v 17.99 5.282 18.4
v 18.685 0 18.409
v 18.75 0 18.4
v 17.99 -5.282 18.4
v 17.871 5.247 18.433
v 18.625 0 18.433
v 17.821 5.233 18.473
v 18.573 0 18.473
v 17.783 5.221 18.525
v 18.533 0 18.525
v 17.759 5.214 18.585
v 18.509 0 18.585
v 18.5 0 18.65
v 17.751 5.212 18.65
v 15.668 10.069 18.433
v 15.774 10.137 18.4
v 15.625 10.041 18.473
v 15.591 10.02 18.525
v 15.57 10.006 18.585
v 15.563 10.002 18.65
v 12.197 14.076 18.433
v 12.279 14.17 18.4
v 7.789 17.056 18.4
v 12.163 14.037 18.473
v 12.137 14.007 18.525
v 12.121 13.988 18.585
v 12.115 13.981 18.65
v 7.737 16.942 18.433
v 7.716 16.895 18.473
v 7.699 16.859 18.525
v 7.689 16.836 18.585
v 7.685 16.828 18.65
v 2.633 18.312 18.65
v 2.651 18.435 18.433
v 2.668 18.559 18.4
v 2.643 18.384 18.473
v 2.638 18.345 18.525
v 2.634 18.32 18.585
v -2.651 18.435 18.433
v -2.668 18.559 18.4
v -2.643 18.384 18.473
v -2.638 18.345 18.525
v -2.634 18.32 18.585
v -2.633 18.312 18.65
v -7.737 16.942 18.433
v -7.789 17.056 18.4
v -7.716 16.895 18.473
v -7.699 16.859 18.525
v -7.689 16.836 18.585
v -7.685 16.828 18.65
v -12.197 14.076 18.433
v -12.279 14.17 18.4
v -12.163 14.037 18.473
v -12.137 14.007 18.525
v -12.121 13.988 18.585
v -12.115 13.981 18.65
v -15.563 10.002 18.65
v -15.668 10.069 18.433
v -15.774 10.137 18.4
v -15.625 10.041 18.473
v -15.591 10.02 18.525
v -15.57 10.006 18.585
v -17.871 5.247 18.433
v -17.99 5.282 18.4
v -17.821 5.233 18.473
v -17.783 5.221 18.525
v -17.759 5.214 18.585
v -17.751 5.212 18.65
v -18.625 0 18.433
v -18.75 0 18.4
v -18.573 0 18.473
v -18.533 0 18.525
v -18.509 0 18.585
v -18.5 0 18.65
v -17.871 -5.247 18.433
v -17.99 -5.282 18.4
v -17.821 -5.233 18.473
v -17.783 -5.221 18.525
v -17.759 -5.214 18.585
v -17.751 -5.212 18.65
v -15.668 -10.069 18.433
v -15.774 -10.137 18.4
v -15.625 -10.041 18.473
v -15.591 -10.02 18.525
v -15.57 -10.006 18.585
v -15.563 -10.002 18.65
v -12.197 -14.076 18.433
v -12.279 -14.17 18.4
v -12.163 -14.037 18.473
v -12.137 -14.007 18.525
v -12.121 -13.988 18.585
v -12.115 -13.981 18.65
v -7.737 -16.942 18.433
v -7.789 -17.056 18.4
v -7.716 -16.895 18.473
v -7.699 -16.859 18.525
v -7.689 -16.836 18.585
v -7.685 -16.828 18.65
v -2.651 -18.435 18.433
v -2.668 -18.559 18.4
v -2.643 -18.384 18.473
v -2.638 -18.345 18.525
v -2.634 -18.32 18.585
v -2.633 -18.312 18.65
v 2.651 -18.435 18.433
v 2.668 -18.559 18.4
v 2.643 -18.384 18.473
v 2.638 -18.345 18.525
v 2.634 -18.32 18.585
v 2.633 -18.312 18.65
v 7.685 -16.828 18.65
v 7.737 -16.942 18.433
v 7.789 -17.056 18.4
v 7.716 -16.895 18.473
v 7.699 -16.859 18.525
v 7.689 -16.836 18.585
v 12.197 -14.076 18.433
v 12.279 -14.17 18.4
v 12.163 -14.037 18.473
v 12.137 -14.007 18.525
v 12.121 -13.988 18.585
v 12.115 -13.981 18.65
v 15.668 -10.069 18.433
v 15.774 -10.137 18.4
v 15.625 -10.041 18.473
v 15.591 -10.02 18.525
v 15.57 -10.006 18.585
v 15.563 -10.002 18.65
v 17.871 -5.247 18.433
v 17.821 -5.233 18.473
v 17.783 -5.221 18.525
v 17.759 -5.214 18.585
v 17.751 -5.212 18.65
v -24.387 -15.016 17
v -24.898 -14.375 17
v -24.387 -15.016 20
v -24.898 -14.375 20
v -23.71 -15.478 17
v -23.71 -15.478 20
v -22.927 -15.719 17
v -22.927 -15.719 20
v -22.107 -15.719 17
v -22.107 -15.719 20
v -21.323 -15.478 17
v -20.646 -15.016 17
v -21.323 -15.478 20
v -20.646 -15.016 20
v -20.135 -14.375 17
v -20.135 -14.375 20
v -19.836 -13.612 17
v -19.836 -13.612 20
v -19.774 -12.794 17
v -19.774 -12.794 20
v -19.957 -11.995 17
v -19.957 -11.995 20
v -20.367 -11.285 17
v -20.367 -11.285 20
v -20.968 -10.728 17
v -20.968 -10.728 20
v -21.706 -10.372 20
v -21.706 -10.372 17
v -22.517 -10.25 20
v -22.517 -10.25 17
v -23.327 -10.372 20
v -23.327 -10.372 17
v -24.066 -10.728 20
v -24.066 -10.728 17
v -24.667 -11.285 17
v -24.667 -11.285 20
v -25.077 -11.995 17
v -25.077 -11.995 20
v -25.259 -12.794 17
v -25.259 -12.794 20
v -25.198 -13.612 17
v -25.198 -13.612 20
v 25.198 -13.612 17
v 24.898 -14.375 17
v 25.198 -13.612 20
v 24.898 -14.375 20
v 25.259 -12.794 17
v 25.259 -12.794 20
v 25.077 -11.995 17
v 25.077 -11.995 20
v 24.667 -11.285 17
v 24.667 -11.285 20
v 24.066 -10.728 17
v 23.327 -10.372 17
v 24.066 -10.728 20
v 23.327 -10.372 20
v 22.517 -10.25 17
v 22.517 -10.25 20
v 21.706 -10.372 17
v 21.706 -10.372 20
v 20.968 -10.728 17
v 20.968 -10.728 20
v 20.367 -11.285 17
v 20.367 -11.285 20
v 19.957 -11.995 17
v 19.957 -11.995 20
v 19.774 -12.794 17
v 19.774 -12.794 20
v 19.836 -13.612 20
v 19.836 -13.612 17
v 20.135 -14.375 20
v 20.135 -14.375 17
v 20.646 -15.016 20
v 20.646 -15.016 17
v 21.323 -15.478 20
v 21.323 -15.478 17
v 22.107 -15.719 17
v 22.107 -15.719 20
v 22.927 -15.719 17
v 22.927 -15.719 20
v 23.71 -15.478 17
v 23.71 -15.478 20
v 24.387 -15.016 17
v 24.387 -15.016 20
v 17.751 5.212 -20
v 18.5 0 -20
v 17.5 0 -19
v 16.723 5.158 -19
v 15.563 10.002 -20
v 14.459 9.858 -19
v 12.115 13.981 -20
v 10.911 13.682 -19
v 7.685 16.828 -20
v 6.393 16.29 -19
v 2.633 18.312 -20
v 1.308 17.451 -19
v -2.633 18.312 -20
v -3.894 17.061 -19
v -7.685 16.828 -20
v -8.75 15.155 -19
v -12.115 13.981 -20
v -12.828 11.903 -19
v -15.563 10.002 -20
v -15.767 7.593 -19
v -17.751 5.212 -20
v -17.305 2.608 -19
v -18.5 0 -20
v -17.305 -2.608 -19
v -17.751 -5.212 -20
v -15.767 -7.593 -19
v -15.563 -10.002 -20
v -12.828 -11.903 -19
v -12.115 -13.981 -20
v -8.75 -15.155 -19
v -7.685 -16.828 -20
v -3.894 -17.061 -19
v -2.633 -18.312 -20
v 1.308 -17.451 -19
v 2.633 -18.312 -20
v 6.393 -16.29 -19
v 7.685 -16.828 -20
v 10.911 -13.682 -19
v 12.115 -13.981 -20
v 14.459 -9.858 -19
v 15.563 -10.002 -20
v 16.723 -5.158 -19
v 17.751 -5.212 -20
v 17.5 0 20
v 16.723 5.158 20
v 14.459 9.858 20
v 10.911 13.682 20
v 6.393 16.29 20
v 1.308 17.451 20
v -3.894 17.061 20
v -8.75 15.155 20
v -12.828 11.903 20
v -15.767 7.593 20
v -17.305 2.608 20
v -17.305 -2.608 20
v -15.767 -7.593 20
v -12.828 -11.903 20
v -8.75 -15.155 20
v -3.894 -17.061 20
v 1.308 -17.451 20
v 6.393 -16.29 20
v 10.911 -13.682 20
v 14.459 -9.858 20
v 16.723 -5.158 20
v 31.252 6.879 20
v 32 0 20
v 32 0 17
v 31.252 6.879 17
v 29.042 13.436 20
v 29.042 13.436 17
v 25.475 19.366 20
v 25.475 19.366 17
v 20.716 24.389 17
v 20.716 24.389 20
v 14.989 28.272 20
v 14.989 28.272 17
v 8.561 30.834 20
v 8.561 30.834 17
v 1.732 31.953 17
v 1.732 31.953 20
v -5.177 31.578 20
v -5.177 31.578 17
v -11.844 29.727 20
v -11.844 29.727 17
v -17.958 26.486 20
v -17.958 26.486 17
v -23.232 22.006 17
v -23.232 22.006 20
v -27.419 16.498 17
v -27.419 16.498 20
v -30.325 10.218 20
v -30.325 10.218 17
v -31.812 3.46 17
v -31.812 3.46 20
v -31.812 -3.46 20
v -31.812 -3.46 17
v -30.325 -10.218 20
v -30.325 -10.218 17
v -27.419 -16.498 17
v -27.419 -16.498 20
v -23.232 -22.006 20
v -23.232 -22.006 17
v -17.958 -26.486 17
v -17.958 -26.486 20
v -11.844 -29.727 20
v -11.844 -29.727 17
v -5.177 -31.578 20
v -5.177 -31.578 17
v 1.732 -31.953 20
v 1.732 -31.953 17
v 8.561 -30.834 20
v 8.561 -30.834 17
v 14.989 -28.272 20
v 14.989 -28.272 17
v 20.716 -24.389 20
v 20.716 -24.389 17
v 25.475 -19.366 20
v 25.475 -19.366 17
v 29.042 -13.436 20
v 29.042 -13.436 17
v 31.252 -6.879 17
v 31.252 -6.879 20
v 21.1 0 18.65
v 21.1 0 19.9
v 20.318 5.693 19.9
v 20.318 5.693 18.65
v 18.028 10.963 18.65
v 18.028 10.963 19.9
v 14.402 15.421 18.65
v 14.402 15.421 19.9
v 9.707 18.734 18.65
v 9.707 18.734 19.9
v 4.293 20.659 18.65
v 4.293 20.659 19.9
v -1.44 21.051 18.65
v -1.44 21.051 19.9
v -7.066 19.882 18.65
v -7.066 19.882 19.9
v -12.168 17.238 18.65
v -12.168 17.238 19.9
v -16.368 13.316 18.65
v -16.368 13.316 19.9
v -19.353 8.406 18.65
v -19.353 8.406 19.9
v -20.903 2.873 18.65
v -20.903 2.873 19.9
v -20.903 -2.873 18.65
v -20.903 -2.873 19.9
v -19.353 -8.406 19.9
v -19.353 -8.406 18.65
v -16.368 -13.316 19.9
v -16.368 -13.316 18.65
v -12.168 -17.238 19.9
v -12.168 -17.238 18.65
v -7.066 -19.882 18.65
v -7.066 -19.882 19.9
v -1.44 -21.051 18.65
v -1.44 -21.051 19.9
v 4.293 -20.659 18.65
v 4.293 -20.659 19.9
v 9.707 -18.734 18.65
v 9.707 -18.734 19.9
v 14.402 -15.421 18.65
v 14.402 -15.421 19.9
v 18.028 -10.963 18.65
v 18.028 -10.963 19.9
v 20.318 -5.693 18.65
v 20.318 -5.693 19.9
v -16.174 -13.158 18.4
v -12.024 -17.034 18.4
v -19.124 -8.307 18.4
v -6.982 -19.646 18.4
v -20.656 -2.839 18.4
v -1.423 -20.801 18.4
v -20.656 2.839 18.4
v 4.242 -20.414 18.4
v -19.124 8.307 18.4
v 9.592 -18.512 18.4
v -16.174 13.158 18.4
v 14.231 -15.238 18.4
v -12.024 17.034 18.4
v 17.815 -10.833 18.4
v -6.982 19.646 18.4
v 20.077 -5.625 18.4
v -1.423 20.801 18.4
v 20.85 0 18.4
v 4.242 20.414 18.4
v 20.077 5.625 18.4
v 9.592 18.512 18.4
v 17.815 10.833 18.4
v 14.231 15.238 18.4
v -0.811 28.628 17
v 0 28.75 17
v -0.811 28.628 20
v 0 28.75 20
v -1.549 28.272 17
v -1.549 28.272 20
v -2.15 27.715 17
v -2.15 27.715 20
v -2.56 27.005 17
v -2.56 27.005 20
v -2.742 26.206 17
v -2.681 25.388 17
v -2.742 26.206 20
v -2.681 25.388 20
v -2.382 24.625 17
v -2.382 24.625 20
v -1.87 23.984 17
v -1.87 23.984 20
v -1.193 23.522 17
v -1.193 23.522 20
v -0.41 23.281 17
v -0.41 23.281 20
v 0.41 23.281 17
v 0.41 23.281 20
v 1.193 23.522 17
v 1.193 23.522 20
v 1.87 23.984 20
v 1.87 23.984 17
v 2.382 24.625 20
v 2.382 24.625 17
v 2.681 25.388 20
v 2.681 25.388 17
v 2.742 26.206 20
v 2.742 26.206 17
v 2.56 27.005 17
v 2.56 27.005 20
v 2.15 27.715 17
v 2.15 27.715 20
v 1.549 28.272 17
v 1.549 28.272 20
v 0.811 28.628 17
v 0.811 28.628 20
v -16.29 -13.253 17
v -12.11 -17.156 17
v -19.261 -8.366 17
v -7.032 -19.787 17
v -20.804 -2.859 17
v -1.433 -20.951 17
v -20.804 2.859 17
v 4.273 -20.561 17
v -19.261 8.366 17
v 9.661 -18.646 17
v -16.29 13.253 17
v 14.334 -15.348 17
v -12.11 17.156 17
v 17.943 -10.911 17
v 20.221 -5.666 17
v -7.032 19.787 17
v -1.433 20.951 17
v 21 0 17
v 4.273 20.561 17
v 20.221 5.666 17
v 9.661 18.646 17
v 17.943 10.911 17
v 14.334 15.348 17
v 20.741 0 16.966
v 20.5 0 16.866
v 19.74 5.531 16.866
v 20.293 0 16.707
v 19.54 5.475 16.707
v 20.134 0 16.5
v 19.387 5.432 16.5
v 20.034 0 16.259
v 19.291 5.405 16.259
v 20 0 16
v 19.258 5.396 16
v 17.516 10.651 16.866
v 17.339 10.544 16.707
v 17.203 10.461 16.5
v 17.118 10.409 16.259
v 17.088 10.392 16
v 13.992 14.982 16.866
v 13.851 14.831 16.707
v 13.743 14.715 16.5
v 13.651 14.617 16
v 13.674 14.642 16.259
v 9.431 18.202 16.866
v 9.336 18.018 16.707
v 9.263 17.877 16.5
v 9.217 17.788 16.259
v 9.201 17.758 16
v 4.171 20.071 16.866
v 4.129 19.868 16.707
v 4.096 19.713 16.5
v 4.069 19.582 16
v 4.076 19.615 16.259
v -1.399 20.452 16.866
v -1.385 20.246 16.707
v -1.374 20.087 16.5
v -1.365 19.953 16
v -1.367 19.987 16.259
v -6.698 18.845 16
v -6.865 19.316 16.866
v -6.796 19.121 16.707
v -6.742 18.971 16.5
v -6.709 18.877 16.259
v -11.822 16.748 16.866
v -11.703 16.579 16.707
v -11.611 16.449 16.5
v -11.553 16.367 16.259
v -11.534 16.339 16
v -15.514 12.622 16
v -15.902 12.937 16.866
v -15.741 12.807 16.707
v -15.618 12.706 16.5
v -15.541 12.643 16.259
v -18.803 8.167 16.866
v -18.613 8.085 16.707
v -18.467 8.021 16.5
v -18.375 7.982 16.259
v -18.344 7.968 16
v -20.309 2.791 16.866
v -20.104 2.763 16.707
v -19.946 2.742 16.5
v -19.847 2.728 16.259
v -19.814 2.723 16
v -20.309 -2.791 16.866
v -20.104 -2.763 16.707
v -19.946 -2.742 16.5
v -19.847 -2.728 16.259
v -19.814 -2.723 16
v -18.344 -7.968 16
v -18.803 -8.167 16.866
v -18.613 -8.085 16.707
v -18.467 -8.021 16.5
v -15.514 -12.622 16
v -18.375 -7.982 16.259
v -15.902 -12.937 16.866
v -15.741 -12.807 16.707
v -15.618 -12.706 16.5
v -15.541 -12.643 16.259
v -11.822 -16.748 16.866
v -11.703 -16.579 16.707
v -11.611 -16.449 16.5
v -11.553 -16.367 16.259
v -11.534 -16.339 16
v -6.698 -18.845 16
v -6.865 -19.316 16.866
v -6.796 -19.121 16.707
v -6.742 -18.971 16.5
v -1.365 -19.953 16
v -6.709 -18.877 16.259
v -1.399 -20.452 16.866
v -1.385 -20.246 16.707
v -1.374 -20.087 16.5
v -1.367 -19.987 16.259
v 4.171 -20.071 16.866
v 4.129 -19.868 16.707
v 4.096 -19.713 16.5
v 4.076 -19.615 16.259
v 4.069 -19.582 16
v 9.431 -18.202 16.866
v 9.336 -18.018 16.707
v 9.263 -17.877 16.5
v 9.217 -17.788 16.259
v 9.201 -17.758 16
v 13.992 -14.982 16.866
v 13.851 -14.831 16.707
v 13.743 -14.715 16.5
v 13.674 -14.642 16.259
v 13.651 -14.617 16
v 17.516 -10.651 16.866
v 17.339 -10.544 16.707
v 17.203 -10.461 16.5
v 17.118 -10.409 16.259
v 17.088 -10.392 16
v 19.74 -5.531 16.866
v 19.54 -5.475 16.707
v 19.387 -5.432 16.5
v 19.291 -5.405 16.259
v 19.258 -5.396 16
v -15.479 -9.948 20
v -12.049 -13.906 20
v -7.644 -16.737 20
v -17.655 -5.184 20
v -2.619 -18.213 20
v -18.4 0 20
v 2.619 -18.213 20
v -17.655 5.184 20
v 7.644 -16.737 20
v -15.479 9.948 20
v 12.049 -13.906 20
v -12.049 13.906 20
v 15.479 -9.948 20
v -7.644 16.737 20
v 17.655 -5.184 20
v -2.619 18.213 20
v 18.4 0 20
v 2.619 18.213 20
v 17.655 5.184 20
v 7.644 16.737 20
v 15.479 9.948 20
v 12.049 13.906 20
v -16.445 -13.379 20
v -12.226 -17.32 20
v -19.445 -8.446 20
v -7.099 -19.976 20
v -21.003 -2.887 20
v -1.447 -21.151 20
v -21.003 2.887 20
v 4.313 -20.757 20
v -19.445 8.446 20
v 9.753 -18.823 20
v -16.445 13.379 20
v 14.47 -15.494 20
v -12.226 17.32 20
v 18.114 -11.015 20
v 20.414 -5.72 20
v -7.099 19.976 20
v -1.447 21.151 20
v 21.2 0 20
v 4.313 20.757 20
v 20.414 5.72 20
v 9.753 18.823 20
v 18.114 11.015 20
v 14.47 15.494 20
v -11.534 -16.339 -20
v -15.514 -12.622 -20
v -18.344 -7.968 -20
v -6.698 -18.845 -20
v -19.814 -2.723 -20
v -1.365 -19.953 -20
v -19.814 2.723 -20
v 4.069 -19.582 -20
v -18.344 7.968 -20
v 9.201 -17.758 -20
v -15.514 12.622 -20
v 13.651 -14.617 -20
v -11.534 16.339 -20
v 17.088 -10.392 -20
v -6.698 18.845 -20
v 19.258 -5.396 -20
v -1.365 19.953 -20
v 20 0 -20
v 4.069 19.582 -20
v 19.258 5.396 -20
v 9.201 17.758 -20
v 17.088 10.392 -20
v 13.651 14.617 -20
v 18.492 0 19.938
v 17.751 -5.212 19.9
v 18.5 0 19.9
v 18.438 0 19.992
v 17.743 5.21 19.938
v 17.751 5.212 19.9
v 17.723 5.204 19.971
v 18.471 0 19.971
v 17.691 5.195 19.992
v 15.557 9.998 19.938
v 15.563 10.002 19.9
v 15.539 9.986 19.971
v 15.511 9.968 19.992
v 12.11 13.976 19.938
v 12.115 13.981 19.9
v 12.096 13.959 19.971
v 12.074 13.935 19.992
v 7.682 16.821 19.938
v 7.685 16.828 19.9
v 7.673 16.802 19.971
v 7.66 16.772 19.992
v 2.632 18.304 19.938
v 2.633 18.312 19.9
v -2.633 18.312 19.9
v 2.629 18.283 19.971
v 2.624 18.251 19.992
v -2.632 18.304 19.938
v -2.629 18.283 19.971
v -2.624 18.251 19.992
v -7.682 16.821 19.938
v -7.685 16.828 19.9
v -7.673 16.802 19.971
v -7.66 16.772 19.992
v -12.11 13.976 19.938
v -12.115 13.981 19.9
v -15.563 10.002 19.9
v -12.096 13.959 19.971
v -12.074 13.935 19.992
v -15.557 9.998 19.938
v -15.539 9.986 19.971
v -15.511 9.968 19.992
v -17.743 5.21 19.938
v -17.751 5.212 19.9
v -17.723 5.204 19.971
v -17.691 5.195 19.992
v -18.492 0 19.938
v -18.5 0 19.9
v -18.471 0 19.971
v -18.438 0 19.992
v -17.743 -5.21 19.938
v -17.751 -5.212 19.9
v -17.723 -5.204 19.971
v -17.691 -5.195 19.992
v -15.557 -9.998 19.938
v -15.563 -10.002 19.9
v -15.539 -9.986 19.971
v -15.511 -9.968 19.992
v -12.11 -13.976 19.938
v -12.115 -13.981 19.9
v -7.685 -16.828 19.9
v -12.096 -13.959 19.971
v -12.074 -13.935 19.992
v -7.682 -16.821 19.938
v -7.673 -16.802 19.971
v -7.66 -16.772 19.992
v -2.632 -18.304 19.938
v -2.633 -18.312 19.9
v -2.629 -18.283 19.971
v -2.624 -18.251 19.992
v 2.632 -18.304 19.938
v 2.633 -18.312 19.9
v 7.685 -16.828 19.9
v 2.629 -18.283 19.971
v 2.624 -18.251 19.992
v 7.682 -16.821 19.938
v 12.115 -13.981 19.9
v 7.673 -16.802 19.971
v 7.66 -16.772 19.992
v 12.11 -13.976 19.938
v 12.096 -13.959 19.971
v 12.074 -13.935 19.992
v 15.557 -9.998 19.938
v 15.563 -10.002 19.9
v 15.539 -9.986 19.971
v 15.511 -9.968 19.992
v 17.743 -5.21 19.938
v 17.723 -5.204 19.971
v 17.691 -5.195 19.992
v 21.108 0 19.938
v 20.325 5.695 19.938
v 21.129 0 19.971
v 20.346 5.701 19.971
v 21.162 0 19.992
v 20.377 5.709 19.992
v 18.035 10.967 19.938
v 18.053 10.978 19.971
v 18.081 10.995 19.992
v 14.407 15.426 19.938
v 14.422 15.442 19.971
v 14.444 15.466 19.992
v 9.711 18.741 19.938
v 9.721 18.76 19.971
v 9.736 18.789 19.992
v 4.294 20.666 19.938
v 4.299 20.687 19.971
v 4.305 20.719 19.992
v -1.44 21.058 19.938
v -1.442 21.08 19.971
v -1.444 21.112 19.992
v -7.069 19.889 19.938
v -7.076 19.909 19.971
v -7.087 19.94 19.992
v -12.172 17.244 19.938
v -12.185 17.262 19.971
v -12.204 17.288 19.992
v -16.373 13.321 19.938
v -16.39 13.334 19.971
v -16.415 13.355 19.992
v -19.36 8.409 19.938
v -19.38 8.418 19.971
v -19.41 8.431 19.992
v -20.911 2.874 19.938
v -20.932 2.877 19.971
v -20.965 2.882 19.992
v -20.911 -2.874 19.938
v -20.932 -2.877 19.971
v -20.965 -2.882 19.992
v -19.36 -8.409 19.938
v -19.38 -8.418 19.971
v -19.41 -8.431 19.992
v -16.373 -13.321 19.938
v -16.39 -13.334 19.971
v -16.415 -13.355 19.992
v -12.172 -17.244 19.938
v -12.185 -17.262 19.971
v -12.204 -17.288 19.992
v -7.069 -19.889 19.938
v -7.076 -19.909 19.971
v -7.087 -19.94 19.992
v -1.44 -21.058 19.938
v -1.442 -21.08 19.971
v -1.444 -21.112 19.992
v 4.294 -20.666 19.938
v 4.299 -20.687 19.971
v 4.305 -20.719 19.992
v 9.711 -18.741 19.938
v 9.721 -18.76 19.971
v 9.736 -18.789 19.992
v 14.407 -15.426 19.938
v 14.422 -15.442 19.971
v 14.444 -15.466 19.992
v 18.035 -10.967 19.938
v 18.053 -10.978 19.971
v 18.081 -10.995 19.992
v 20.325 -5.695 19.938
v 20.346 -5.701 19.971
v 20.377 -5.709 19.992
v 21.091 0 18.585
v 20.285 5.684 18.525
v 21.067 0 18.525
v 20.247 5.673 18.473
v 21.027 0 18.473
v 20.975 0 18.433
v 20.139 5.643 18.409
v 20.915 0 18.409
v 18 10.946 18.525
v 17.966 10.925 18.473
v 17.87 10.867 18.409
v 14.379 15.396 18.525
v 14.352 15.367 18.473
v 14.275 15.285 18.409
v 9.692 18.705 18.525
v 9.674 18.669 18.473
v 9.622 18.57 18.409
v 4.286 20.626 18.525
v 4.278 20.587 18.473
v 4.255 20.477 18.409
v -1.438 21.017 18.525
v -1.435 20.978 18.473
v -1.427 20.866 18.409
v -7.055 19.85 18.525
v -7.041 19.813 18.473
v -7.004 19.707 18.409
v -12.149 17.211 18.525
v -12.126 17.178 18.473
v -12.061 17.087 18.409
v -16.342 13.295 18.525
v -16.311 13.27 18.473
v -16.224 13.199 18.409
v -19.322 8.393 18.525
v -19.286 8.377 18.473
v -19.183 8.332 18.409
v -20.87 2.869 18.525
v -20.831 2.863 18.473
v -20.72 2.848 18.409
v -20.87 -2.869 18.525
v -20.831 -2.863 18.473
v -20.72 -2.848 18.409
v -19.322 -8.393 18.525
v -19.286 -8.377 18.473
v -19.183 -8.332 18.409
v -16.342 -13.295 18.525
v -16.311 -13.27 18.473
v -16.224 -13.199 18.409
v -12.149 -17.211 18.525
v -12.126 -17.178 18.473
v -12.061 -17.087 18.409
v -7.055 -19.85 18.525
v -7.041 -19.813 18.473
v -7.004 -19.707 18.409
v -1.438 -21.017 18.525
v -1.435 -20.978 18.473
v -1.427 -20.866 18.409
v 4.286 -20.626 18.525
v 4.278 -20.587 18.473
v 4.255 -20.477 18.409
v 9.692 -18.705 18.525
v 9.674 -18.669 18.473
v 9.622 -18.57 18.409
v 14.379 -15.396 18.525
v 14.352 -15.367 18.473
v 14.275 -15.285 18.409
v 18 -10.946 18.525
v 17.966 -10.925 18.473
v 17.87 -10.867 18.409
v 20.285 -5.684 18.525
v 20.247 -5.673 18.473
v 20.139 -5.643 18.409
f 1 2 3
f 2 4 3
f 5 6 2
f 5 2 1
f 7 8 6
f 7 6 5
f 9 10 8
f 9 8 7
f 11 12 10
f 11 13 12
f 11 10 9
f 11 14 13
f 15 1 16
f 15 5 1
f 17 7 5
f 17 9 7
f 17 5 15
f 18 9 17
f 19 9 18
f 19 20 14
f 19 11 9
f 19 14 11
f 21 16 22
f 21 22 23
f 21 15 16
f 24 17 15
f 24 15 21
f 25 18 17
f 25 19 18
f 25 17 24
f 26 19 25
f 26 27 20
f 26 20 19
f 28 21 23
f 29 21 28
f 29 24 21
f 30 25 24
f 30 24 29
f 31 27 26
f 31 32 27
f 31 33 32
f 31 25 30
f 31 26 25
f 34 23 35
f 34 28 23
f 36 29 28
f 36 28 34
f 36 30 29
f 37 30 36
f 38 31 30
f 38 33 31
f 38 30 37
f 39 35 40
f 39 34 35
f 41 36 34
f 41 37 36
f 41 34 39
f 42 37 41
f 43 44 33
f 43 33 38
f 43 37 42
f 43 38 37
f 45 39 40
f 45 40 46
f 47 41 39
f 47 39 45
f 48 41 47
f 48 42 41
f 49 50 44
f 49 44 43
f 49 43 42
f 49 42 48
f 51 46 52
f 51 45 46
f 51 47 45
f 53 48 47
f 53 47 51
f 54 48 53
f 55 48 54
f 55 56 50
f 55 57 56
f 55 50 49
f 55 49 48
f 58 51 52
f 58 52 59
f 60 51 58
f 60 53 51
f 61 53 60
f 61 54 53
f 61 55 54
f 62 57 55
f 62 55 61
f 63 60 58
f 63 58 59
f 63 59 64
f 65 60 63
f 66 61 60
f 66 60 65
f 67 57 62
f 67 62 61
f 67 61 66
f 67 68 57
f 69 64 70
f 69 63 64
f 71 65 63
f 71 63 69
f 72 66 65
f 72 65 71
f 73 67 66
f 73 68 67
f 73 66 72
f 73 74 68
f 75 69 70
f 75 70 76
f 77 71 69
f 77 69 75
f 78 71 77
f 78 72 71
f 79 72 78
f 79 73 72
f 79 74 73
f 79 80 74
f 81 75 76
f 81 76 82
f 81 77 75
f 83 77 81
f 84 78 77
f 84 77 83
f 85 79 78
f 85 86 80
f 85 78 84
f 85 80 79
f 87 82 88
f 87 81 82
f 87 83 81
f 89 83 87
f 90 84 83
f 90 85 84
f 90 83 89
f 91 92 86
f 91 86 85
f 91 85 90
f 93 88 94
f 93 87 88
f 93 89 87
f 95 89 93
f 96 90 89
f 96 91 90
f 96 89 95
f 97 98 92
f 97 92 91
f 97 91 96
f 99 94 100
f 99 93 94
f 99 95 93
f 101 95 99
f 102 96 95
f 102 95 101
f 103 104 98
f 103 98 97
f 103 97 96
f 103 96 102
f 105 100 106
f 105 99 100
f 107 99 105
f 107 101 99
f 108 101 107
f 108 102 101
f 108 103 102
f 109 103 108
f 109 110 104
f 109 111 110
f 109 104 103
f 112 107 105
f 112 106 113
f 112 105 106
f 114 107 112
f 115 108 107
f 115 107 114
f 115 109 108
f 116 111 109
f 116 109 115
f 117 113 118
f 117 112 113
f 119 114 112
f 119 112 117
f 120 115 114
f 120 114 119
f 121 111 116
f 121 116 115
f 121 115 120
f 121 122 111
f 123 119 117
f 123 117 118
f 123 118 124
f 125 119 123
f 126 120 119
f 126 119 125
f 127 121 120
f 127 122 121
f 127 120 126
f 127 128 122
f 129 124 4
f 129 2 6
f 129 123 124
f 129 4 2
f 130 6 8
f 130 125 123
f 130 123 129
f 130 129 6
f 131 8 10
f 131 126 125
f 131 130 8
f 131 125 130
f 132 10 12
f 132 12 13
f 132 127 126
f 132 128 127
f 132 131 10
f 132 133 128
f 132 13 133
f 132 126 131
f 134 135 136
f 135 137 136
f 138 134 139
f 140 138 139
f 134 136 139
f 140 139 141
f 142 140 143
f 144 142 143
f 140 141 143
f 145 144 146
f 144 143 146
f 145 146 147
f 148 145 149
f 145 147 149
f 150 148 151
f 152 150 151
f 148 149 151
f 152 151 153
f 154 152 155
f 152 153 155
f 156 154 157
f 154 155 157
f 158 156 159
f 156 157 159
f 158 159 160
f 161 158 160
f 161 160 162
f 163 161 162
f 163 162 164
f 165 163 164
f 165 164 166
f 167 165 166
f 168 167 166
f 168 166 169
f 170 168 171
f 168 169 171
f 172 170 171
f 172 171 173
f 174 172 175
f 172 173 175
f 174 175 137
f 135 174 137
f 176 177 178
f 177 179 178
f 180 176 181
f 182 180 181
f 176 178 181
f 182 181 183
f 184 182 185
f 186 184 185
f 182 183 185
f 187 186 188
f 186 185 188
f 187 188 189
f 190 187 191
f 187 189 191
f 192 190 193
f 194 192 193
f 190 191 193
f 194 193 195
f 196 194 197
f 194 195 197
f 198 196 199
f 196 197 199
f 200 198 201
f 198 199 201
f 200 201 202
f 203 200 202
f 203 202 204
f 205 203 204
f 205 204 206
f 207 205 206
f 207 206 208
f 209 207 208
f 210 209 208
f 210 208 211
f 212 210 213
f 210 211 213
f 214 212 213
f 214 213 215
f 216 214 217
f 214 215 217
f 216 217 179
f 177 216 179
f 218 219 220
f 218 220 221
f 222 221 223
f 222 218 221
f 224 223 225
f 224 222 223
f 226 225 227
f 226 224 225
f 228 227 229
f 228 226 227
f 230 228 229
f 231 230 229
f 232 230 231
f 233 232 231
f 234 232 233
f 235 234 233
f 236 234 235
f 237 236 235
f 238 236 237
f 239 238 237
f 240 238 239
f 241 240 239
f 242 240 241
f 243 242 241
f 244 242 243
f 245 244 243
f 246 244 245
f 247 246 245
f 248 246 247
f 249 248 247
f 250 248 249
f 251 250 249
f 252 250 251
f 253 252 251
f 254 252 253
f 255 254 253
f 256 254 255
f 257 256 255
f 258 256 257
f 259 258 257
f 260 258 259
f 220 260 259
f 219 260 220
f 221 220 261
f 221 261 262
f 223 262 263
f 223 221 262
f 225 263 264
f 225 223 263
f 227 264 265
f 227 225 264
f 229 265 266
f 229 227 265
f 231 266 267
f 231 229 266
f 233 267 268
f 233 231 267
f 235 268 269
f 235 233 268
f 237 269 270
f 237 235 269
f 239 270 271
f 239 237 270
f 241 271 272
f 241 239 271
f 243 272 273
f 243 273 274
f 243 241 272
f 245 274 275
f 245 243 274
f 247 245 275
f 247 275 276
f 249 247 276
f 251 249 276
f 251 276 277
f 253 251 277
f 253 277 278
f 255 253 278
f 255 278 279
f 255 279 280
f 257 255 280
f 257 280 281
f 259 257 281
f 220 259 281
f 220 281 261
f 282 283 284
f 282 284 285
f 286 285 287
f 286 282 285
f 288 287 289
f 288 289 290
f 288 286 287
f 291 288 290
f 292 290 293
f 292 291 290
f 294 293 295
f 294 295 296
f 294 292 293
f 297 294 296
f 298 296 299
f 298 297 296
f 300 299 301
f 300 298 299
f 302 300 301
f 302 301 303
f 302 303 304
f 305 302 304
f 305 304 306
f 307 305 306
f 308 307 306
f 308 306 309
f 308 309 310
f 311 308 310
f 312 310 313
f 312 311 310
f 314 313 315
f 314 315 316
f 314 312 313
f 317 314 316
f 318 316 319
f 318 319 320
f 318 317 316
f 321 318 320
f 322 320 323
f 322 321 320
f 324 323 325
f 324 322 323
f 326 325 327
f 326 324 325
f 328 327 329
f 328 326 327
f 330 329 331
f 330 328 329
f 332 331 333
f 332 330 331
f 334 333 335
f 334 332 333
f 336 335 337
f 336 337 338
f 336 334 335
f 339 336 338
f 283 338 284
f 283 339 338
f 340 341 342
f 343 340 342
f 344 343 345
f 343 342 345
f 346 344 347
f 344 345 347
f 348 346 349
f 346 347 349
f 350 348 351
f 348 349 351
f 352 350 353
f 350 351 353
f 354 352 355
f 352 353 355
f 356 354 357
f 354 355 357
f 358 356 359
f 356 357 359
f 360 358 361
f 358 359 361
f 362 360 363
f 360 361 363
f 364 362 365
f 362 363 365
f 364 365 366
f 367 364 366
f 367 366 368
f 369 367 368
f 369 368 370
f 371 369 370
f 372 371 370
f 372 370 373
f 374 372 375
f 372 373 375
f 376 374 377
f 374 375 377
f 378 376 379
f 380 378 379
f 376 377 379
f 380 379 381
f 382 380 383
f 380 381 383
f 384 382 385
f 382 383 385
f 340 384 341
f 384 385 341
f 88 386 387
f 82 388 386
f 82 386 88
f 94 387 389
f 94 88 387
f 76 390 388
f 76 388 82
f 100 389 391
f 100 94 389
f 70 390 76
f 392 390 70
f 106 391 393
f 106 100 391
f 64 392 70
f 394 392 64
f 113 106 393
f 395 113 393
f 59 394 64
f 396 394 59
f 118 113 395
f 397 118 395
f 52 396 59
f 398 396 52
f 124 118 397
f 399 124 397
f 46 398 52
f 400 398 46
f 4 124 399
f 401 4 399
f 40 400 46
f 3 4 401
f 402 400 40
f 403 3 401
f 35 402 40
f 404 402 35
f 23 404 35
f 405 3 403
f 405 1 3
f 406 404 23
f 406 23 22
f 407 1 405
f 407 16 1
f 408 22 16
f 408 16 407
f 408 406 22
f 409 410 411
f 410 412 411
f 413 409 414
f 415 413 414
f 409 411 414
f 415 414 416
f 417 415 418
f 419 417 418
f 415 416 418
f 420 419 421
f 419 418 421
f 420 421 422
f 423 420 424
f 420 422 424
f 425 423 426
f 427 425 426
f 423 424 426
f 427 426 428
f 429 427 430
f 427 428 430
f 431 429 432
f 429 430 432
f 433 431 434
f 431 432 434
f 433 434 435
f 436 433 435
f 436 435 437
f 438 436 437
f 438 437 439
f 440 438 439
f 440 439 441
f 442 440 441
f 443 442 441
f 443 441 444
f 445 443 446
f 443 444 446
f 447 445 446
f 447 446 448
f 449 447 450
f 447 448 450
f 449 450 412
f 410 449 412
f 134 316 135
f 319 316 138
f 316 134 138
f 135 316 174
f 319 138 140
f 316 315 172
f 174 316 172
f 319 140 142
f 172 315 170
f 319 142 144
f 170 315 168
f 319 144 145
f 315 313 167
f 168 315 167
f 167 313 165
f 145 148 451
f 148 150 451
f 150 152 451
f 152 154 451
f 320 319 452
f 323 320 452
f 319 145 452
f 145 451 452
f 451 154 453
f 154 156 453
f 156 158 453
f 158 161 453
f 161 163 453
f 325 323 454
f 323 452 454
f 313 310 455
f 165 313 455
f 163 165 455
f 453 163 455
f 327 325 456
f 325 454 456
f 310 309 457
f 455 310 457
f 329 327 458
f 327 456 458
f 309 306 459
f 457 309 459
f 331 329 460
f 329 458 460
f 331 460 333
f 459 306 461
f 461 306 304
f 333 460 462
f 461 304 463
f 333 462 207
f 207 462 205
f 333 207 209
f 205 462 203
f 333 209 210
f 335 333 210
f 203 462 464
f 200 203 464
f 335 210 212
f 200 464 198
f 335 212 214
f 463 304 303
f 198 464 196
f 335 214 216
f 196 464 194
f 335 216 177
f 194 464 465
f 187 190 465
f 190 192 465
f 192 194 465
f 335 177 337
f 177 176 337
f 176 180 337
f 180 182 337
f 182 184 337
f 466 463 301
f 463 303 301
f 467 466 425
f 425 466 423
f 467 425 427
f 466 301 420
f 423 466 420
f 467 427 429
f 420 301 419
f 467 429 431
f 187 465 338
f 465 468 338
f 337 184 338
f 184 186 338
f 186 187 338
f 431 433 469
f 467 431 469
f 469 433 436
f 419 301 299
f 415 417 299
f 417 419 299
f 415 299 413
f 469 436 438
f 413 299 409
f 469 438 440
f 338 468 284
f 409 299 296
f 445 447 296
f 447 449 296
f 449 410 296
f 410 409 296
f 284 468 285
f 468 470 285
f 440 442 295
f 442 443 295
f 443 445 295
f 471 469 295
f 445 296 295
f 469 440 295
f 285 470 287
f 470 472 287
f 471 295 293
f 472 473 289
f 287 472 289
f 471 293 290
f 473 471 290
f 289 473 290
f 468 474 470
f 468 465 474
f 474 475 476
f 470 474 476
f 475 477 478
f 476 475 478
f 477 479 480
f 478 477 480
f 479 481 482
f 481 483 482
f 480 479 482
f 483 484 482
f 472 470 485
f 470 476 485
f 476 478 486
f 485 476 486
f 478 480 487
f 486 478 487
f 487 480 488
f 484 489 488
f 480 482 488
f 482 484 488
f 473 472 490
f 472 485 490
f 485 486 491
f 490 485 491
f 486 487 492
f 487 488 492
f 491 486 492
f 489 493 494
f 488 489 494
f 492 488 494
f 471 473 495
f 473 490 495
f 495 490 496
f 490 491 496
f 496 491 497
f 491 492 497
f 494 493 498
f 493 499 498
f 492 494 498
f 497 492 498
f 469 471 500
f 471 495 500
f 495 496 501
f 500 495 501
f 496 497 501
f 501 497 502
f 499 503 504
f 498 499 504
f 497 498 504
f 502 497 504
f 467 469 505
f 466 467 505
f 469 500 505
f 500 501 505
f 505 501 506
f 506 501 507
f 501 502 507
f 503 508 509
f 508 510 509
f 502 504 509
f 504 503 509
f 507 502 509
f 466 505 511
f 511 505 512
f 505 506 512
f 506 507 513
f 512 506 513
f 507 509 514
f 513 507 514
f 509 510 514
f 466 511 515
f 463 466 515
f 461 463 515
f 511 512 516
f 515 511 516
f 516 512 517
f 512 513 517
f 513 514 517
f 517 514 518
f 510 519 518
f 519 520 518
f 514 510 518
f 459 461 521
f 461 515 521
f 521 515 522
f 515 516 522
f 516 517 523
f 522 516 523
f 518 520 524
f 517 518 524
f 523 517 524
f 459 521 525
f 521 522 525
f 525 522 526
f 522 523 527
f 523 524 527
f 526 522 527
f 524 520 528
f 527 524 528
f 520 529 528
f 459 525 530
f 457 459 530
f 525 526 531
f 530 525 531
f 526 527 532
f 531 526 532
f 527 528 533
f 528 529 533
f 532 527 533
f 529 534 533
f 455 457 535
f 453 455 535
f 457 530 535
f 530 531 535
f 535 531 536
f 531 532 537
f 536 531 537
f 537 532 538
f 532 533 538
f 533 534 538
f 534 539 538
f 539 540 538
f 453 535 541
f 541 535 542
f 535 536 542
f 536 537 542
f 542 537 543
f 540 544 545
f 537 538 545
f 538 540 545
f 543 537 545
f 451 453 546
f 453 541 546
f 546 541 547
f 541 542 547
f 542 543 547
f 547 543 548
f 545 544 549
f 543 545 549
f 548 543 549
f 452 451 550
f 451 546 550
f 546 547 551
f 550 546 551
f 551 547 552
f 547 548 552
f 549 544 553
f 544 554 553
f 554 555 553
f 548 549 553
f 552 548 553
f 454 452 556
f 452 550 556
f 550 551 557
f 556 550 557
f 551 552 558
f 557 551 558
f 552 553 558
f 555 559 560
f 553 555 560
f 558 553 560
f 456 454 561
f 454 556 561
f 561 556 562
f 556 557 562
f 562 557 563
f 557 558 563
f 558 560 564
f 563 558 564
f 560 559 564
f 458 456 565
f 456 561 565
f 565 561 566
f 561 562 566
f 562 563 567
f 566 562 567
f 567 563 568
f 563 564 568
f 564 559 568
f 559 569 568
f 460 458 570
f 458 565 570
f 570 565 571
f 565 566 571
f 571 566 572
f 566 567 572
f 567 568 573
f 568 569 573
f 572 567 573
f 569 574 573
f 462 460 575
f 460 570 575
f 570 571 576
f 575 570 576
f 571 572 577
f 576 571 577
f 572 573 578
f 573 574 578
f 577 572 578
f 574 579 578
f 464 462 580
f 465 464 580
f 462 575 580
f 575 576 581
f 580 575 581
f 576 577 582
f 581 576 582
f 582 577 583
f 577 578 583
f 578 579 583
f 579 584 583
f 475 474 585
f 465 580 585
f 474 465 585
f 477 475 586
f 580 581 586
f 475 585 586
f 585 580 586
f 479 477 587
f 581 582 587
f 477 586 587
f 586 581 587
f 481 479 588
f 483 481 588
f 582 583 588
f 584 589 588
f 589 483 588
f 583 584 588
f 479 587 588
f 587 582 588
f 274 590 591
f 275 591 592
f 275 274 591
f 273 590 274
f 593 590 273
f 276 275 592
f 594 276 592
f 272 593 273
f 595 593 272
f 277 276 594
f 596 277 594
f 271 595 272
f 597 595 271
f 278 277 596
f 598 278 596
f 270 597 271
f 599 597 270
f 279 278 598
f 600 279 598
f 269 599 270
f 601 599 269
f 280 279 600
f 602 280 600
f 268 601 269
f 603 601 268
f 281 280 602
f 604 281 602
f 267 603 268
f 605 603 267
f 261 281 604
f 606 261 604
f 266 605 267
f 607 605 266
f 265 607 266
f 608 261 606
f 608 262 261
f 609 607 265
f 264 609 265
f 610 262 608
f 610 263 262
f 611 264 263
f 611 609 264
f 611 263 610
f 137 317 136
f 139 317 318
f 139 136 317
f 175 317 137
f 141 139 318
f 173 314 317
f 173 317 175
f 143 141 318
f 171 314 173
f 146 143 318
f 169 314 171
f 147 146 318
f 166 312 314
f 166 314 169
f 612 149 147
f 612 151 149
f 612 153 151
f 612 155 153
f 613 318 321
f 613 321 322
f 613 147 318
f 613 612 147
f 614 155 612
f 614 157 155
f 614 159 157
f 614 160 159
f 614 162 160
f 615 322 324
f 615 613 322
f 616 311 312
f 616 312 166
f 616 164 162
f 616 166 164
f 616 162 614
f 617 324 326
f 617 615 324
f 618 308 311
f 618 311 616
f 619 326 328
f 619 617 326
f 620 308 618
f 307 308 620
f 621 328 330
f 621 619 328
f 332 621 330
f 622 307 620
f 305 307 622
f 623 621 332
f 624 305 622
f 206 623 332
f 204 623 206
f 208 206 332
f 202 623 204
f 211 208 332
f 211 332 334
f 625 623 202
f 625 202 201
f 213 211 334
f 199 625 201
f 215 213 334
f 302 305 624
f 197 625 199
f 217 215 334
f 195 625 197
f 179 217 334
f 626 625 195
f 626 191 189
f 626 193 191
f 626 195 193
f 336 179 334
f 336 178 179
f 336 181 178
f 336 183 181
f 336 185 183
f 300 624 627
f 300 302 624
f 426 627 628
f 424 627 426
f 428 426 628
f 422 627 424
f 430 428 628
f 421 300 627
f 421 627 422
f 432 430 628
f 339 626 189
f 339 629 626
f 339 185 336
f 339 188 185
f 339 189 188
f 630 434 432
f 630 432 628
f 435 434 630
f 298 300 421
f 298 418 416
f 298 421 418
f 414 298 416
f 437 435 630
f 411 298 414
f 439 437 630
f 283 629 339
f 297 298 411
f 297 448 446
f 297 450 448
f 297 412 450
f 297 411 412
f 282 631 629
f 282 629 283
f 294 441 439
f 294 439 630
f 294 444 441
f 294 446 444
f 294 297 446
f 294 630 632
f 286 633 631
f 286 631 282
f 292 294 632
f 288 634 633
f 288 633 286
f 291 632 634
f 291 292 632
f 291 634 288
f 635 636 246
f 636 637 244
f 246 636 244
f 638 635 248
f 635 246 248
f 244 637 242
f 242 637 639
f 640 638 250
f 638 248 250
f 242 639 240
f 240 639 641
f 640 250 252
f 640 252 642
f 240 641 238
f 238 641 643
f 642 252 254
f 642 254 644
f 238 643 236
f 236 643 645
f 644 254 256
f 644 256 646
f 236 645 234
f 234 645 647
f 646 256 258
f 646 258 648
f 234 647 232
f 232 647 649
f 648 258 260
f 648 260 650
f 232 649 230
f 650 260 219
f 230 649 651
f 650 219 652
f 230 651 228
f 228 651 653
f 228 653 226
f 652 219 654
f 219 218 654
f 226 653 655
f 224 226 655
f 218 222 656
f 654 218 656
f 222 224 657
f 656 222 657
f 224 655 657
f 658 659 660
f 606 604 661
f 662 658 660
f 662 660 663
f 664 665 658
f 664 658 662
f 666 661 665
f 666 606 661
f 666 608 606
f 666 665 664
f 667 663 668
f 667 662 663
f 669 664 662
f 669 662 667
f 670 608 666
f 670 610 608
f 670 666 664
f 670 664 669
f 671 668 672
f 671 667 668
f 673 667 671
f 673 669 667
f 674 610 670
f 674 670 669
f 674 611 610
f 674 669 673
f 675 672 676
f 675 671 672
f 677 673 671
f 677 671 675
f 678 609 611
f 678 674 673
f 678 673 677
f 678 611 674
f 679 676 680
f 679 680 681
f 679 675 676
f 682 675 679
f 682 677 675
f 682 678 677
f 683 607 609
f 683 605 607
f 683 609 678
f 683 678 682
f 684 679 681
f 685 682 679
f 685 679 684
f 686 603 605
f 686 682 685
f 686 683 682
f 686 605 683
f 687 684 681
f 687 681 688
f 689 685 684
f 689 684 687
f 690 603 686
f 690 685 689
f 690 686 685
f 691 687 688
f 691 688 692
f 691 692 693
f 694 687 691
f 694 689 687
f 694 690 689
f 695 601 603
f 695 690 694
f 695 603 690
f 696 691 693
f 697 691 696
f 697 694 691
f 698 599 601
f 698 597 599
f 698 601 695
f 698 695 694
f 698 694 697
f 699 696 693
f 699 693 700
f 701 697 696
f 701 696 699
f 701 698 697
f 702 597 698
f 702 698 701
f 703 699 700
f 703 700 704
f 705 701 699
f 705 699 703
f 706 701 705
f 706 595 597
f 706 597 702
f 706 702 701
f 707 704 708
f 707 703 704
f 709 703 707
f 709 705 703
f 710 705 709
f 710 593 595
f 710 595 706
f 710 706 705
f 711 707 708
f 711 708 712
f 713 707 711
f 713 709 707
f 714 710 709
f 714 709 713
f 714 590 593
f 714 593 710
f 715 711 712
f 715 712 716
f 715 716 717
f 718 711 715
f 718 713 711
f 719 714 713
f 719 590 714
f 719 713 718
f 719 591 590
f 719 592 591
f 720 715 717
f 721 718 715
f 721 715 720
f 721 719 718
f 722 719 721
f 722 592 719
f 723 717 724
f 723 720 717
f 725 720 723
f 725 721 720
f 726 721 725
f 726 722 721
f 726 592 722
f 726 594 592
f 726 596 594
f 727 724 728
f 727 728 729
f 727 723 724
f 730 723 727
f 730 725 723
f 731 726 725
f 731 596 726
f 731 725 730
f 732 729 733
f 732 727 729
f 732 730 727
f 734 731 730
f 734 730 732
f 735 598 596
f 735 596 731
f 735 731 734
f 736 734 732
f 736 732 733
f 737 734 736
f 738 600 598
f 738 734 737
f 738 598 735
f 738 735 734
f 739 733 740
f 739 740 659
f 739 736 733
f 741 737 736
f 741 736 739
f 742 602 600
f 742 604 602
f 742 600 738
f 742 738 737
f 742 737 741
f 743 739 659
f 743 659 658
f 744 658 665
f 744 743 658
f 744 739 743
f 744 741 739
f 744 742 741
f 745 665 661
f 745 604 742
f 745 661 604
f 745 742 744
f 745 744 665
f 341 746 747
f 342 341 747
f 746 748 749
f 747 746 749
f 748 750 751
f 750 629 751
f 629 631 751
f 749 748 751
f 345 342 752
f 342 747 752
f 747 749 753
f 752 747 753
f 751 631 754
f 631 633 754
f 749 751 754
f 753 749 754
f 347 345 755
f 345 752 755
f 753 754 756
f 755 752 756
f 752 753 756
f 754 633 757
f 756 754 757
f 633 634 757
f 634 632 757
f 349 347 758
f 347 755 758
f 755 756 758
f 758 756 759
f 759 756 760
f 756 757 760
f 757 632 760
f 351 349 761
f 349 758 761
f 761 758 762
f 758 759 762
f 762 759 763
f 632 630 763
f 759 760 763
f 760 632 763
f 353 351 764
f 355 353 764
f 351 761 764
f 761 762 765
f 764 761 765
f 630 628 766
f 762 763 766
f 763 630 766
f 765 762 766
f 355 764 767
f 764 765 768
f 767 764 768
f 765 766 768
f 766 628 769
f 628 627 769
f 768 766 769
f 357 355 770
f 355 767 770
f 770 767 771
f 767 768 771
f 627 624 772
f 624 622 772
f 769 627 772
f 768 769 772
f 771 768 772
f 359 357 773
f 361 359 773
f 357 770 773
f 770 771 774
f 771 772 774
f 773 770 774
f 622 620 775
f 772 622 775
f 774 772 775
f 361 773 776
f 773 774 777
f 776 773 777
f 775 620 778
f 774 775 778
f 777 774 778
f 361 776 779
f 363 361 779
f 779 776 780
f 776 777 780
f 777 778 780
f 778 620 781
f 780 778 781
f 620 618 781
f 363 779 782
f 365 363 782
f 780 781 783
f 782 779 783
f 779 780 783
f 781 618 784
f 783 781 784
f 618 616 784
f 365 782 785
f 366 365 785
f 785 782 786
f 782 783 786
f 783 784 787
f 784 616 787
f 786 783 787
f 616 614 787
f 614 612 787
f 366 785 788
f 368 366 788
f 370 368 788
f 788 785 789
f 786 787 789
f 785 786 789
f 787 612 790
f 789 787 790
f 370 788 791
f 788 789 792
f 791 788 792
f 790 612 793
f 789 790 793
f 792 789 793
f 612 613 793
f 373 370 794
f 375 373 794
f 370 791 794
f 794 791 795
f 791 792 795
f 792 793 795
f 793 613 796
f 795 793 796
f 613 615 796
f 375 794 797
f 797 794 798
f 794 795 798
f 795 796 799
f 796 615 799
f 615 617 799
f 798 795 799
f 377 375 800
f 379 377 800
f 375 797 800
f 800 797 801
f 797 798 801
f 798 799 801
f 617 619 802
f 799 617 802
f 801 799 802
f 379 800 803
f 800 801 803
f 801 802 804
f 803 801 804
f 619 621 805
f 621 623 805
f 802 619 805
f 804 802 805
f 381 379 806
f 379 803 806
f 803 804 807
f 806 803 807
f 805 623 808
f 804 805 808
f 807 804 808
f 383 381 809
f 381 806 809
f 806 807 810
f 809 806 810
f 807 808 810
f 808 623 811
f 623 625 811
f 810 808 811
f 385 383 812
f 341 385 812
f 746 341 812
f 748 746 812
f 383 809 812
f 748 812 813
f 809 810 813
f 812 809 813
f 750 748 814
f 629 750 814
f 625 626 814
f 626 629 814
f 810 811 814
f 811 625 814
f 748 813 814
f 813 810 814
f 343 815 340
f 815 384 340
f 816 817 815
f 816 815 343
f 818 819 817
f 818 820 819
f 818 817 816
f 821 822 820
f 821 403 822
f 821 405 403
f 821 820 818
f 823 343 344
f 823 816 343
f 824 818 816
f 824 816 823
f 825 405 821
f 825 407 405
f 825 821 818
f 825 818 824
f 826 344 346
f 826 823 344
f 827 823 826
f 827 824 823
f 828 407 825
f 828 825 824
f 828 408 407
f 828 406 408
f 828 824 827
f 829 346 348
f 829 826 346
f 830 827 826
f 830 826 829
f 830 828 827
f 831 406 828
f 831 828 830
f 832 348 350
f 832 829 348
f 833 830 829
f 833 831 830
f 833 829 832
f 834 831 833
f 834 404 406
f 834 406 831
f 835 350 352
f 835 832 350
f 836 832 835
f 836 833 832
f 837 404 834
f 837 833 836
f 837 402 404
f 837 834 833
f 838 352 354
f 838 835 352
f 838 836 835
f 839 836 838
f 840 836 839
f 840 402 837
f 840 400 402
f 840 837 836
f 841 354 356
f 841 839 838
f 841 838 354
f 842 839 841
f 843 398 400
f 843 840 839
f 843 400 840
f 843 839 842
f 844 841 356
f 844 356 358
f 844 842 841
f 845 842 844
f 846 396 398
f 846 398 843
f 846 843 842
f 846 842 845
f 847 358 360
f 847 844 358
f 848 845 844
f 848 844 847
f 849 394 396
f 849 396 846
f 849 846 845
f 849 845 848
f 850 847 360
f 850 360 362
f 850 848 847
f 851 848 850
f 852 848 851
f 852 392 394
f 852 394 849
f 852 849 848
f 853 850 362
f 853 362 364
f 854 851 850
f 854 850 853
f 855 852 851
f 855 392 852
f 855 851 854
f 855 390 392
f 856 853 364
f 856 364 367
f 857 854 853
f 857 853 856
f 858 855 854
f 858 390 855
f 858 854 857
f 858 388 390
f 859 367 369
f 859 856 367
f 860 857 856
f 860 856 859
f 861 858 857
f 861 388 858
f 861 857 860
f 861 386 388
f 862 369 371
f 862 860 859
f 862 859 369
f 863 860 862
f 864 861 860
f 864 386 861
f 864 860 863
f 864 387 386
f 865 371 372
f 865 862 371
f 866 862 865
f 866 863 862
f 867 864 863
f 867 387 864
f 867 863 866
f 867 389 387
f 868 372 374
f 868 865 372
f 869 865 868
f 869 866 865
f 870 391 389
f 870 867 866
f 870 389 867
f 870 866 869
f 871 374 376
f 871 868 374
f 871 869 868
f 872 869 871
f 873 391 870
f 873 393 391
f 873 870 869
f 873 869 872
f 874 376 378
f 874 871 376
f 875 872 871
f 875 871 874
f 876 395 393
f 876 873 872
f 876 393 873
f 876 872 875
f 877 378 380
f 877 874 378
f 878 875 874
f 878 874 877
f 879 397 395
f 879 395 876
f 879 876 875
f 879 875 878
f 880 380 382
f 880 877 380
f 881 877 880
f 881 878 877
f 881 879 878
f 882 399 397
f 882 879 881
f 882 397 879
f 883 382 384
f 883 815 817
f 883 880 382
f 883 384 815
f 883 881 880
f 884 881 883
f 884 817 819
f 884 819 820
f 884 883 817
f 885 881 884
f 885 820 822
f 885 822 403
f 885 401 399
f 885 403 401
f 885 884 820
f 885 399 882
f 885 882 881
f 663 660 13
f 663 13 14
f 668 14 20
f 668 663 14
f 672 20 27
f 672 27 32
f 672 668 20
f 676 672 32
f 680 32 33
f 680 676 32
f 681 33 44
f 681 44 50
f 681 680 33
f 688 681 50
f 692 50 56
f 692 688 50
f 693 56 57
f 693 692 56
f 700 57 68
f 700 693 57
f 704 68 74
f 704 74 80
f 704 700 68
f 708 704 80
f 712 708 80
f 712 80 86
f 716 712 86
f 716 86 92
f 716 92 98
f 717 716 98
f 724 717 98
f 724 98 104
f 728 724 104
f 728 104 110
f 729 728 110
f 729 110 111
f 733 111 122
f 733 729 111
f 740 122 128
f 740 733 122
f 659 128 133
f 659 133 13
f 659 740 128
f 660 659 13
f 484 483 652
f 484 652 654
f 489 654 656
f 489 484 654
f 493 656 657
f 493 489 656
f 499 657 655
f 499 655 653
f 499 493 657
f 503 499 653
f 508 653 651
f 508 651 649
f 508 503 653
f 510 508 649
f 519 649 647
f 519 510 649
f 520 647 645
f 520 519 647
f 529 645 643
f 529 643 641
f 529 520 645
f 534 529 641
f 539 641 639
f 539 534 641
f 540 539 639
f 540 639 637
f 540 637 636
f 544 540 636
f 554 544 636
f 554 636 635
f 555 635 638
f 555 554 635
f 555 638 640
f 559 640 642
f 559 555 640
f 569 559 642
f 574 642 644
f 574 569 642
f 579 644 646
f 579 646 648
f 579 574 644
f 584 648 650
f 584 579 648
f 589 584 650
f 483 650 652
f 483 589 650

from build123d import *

# Parameters (mm, degrees)
SKETCH1_R           = 20
SKETCH1_R_2         = 17.5
BOSS_EXTRUDE1_DEPTH = 20
SKETCH2_R           = 32
SKETCH2_R_2         = 20
BOSS_EXTRUDE2_DEPTH = 3
SKETCH4_W           = 2.75
SKETCH4_H           = 3
CIRPATTERN1_COUNT   = 3
CHAMFER1_SIZE       = 1
SKETCH5_R           = 21.1
SKETCH5_R_2         = 18.5
CUT_EXTRUDE1_DEPTH  = 1.6
FILLET1_R           = 0.25
FILLET2_R           = 0.1
FILLET3_R           = 1


with BuildPart() as part:
    # Sketch1 → Boss-Extrude1 (new body, symmetric)
    with BuildSketch(Plane.XY):
        Circle(SKETCH1_R)
        Circle(SKETCH1_R_2, mode=Mode.SUBTRACT)
    extrude(amount=BOSS_EXTRUDE1_DEPTH, both=True)

    # Chamfer1
    chamfer1_edges = [part.edges().sort_by_distance(p)[0] for p in [
        (-17.5, 0, -20),
    ]]
    chamfer(chamfer1_edges, length=CHAMFER1_SIZE)


with BuildPart() as body_2:
    # Sketch2 → Boss-Extrude2 (new body)
    with BuildSketch(Plane.XY.offset(20)):
        Circle(SKETCH2_R)
        Circle(SKETCH2_R_2, mode=Mode.SUBTRACT)
    extrude(amount=-BOSS_EXTRUDE2_DEPTH)

    # Sketch4 → M5 Clearance Hole1 (revolve, cut)
    with BuildSketch(Plane(origin=(0, 26, 17), x_dir=(0, 1, 0), z_dir=(1, 0, 0))):
        with Locations((1.375, 1.5)):
            Rectangle(SKETCH4_W, SKETCH4_H)
    m5_clearance_hole1 = revolve(axis=Axis((0, 26, 10.65), (0, 0, 1)), mode=Mode.SUBTRACT)

    # CirPattern1: M5 Clearance Hole1 ×3 about axis
    cirpattern1_axis = Axis((0, 0, 0), (0, 0, 1))
    for i in range(1, CIRPATTERN1_COUNT):
        add(m5_clearance_hole1.rotate(cirpattern1_axis, i * 360 / CIRPATTERN1_COUNT), mode=Mode.SUBTRACT)


with BuildPart() as part_1:
    add(part.part)

    # Combine1: union body 2
    add(body_2.part)

    # Sketch5 → Cut-Extrude1 (cut)
    with BuildSketch(Plane.XY.offset(20)):
        Circle(SKETCH5_R)
        Circle(SKETCH5_R_2, mode=Mode.SUBTRACT)
    extrude(amount=-CUT_EXTRUDE1_DEPTH, mode=Mode.SUBTRACT)

    # Fillet1
    fillet1_edges = [part_1.edges().sort_by_distance(p)[0] for p in [
        (-21.1, 0, 18.4),
        (-18.5, 0, 18.4),
    ]]
    fillet(fillet1_edges, radius=FILLET1_R)

    # Fillet2
    fillet2_edges = [part_1.edges().sort_by_distance(p)[0] for p in [
        (-21.1, 0, 20),
        (-18.5, 0, 20),
    ]]
    fillet(fillet2_edges, radius=FILLET2_R)

    # Fillet3
    fillet3_edges = [part_1.edges().sort_by_distance(p)[0] for p in [
        (-20, 0, 17),
    ]]
    fillet(fillet3_edges, radius=FILLET3_R)


solid = part_1.part
